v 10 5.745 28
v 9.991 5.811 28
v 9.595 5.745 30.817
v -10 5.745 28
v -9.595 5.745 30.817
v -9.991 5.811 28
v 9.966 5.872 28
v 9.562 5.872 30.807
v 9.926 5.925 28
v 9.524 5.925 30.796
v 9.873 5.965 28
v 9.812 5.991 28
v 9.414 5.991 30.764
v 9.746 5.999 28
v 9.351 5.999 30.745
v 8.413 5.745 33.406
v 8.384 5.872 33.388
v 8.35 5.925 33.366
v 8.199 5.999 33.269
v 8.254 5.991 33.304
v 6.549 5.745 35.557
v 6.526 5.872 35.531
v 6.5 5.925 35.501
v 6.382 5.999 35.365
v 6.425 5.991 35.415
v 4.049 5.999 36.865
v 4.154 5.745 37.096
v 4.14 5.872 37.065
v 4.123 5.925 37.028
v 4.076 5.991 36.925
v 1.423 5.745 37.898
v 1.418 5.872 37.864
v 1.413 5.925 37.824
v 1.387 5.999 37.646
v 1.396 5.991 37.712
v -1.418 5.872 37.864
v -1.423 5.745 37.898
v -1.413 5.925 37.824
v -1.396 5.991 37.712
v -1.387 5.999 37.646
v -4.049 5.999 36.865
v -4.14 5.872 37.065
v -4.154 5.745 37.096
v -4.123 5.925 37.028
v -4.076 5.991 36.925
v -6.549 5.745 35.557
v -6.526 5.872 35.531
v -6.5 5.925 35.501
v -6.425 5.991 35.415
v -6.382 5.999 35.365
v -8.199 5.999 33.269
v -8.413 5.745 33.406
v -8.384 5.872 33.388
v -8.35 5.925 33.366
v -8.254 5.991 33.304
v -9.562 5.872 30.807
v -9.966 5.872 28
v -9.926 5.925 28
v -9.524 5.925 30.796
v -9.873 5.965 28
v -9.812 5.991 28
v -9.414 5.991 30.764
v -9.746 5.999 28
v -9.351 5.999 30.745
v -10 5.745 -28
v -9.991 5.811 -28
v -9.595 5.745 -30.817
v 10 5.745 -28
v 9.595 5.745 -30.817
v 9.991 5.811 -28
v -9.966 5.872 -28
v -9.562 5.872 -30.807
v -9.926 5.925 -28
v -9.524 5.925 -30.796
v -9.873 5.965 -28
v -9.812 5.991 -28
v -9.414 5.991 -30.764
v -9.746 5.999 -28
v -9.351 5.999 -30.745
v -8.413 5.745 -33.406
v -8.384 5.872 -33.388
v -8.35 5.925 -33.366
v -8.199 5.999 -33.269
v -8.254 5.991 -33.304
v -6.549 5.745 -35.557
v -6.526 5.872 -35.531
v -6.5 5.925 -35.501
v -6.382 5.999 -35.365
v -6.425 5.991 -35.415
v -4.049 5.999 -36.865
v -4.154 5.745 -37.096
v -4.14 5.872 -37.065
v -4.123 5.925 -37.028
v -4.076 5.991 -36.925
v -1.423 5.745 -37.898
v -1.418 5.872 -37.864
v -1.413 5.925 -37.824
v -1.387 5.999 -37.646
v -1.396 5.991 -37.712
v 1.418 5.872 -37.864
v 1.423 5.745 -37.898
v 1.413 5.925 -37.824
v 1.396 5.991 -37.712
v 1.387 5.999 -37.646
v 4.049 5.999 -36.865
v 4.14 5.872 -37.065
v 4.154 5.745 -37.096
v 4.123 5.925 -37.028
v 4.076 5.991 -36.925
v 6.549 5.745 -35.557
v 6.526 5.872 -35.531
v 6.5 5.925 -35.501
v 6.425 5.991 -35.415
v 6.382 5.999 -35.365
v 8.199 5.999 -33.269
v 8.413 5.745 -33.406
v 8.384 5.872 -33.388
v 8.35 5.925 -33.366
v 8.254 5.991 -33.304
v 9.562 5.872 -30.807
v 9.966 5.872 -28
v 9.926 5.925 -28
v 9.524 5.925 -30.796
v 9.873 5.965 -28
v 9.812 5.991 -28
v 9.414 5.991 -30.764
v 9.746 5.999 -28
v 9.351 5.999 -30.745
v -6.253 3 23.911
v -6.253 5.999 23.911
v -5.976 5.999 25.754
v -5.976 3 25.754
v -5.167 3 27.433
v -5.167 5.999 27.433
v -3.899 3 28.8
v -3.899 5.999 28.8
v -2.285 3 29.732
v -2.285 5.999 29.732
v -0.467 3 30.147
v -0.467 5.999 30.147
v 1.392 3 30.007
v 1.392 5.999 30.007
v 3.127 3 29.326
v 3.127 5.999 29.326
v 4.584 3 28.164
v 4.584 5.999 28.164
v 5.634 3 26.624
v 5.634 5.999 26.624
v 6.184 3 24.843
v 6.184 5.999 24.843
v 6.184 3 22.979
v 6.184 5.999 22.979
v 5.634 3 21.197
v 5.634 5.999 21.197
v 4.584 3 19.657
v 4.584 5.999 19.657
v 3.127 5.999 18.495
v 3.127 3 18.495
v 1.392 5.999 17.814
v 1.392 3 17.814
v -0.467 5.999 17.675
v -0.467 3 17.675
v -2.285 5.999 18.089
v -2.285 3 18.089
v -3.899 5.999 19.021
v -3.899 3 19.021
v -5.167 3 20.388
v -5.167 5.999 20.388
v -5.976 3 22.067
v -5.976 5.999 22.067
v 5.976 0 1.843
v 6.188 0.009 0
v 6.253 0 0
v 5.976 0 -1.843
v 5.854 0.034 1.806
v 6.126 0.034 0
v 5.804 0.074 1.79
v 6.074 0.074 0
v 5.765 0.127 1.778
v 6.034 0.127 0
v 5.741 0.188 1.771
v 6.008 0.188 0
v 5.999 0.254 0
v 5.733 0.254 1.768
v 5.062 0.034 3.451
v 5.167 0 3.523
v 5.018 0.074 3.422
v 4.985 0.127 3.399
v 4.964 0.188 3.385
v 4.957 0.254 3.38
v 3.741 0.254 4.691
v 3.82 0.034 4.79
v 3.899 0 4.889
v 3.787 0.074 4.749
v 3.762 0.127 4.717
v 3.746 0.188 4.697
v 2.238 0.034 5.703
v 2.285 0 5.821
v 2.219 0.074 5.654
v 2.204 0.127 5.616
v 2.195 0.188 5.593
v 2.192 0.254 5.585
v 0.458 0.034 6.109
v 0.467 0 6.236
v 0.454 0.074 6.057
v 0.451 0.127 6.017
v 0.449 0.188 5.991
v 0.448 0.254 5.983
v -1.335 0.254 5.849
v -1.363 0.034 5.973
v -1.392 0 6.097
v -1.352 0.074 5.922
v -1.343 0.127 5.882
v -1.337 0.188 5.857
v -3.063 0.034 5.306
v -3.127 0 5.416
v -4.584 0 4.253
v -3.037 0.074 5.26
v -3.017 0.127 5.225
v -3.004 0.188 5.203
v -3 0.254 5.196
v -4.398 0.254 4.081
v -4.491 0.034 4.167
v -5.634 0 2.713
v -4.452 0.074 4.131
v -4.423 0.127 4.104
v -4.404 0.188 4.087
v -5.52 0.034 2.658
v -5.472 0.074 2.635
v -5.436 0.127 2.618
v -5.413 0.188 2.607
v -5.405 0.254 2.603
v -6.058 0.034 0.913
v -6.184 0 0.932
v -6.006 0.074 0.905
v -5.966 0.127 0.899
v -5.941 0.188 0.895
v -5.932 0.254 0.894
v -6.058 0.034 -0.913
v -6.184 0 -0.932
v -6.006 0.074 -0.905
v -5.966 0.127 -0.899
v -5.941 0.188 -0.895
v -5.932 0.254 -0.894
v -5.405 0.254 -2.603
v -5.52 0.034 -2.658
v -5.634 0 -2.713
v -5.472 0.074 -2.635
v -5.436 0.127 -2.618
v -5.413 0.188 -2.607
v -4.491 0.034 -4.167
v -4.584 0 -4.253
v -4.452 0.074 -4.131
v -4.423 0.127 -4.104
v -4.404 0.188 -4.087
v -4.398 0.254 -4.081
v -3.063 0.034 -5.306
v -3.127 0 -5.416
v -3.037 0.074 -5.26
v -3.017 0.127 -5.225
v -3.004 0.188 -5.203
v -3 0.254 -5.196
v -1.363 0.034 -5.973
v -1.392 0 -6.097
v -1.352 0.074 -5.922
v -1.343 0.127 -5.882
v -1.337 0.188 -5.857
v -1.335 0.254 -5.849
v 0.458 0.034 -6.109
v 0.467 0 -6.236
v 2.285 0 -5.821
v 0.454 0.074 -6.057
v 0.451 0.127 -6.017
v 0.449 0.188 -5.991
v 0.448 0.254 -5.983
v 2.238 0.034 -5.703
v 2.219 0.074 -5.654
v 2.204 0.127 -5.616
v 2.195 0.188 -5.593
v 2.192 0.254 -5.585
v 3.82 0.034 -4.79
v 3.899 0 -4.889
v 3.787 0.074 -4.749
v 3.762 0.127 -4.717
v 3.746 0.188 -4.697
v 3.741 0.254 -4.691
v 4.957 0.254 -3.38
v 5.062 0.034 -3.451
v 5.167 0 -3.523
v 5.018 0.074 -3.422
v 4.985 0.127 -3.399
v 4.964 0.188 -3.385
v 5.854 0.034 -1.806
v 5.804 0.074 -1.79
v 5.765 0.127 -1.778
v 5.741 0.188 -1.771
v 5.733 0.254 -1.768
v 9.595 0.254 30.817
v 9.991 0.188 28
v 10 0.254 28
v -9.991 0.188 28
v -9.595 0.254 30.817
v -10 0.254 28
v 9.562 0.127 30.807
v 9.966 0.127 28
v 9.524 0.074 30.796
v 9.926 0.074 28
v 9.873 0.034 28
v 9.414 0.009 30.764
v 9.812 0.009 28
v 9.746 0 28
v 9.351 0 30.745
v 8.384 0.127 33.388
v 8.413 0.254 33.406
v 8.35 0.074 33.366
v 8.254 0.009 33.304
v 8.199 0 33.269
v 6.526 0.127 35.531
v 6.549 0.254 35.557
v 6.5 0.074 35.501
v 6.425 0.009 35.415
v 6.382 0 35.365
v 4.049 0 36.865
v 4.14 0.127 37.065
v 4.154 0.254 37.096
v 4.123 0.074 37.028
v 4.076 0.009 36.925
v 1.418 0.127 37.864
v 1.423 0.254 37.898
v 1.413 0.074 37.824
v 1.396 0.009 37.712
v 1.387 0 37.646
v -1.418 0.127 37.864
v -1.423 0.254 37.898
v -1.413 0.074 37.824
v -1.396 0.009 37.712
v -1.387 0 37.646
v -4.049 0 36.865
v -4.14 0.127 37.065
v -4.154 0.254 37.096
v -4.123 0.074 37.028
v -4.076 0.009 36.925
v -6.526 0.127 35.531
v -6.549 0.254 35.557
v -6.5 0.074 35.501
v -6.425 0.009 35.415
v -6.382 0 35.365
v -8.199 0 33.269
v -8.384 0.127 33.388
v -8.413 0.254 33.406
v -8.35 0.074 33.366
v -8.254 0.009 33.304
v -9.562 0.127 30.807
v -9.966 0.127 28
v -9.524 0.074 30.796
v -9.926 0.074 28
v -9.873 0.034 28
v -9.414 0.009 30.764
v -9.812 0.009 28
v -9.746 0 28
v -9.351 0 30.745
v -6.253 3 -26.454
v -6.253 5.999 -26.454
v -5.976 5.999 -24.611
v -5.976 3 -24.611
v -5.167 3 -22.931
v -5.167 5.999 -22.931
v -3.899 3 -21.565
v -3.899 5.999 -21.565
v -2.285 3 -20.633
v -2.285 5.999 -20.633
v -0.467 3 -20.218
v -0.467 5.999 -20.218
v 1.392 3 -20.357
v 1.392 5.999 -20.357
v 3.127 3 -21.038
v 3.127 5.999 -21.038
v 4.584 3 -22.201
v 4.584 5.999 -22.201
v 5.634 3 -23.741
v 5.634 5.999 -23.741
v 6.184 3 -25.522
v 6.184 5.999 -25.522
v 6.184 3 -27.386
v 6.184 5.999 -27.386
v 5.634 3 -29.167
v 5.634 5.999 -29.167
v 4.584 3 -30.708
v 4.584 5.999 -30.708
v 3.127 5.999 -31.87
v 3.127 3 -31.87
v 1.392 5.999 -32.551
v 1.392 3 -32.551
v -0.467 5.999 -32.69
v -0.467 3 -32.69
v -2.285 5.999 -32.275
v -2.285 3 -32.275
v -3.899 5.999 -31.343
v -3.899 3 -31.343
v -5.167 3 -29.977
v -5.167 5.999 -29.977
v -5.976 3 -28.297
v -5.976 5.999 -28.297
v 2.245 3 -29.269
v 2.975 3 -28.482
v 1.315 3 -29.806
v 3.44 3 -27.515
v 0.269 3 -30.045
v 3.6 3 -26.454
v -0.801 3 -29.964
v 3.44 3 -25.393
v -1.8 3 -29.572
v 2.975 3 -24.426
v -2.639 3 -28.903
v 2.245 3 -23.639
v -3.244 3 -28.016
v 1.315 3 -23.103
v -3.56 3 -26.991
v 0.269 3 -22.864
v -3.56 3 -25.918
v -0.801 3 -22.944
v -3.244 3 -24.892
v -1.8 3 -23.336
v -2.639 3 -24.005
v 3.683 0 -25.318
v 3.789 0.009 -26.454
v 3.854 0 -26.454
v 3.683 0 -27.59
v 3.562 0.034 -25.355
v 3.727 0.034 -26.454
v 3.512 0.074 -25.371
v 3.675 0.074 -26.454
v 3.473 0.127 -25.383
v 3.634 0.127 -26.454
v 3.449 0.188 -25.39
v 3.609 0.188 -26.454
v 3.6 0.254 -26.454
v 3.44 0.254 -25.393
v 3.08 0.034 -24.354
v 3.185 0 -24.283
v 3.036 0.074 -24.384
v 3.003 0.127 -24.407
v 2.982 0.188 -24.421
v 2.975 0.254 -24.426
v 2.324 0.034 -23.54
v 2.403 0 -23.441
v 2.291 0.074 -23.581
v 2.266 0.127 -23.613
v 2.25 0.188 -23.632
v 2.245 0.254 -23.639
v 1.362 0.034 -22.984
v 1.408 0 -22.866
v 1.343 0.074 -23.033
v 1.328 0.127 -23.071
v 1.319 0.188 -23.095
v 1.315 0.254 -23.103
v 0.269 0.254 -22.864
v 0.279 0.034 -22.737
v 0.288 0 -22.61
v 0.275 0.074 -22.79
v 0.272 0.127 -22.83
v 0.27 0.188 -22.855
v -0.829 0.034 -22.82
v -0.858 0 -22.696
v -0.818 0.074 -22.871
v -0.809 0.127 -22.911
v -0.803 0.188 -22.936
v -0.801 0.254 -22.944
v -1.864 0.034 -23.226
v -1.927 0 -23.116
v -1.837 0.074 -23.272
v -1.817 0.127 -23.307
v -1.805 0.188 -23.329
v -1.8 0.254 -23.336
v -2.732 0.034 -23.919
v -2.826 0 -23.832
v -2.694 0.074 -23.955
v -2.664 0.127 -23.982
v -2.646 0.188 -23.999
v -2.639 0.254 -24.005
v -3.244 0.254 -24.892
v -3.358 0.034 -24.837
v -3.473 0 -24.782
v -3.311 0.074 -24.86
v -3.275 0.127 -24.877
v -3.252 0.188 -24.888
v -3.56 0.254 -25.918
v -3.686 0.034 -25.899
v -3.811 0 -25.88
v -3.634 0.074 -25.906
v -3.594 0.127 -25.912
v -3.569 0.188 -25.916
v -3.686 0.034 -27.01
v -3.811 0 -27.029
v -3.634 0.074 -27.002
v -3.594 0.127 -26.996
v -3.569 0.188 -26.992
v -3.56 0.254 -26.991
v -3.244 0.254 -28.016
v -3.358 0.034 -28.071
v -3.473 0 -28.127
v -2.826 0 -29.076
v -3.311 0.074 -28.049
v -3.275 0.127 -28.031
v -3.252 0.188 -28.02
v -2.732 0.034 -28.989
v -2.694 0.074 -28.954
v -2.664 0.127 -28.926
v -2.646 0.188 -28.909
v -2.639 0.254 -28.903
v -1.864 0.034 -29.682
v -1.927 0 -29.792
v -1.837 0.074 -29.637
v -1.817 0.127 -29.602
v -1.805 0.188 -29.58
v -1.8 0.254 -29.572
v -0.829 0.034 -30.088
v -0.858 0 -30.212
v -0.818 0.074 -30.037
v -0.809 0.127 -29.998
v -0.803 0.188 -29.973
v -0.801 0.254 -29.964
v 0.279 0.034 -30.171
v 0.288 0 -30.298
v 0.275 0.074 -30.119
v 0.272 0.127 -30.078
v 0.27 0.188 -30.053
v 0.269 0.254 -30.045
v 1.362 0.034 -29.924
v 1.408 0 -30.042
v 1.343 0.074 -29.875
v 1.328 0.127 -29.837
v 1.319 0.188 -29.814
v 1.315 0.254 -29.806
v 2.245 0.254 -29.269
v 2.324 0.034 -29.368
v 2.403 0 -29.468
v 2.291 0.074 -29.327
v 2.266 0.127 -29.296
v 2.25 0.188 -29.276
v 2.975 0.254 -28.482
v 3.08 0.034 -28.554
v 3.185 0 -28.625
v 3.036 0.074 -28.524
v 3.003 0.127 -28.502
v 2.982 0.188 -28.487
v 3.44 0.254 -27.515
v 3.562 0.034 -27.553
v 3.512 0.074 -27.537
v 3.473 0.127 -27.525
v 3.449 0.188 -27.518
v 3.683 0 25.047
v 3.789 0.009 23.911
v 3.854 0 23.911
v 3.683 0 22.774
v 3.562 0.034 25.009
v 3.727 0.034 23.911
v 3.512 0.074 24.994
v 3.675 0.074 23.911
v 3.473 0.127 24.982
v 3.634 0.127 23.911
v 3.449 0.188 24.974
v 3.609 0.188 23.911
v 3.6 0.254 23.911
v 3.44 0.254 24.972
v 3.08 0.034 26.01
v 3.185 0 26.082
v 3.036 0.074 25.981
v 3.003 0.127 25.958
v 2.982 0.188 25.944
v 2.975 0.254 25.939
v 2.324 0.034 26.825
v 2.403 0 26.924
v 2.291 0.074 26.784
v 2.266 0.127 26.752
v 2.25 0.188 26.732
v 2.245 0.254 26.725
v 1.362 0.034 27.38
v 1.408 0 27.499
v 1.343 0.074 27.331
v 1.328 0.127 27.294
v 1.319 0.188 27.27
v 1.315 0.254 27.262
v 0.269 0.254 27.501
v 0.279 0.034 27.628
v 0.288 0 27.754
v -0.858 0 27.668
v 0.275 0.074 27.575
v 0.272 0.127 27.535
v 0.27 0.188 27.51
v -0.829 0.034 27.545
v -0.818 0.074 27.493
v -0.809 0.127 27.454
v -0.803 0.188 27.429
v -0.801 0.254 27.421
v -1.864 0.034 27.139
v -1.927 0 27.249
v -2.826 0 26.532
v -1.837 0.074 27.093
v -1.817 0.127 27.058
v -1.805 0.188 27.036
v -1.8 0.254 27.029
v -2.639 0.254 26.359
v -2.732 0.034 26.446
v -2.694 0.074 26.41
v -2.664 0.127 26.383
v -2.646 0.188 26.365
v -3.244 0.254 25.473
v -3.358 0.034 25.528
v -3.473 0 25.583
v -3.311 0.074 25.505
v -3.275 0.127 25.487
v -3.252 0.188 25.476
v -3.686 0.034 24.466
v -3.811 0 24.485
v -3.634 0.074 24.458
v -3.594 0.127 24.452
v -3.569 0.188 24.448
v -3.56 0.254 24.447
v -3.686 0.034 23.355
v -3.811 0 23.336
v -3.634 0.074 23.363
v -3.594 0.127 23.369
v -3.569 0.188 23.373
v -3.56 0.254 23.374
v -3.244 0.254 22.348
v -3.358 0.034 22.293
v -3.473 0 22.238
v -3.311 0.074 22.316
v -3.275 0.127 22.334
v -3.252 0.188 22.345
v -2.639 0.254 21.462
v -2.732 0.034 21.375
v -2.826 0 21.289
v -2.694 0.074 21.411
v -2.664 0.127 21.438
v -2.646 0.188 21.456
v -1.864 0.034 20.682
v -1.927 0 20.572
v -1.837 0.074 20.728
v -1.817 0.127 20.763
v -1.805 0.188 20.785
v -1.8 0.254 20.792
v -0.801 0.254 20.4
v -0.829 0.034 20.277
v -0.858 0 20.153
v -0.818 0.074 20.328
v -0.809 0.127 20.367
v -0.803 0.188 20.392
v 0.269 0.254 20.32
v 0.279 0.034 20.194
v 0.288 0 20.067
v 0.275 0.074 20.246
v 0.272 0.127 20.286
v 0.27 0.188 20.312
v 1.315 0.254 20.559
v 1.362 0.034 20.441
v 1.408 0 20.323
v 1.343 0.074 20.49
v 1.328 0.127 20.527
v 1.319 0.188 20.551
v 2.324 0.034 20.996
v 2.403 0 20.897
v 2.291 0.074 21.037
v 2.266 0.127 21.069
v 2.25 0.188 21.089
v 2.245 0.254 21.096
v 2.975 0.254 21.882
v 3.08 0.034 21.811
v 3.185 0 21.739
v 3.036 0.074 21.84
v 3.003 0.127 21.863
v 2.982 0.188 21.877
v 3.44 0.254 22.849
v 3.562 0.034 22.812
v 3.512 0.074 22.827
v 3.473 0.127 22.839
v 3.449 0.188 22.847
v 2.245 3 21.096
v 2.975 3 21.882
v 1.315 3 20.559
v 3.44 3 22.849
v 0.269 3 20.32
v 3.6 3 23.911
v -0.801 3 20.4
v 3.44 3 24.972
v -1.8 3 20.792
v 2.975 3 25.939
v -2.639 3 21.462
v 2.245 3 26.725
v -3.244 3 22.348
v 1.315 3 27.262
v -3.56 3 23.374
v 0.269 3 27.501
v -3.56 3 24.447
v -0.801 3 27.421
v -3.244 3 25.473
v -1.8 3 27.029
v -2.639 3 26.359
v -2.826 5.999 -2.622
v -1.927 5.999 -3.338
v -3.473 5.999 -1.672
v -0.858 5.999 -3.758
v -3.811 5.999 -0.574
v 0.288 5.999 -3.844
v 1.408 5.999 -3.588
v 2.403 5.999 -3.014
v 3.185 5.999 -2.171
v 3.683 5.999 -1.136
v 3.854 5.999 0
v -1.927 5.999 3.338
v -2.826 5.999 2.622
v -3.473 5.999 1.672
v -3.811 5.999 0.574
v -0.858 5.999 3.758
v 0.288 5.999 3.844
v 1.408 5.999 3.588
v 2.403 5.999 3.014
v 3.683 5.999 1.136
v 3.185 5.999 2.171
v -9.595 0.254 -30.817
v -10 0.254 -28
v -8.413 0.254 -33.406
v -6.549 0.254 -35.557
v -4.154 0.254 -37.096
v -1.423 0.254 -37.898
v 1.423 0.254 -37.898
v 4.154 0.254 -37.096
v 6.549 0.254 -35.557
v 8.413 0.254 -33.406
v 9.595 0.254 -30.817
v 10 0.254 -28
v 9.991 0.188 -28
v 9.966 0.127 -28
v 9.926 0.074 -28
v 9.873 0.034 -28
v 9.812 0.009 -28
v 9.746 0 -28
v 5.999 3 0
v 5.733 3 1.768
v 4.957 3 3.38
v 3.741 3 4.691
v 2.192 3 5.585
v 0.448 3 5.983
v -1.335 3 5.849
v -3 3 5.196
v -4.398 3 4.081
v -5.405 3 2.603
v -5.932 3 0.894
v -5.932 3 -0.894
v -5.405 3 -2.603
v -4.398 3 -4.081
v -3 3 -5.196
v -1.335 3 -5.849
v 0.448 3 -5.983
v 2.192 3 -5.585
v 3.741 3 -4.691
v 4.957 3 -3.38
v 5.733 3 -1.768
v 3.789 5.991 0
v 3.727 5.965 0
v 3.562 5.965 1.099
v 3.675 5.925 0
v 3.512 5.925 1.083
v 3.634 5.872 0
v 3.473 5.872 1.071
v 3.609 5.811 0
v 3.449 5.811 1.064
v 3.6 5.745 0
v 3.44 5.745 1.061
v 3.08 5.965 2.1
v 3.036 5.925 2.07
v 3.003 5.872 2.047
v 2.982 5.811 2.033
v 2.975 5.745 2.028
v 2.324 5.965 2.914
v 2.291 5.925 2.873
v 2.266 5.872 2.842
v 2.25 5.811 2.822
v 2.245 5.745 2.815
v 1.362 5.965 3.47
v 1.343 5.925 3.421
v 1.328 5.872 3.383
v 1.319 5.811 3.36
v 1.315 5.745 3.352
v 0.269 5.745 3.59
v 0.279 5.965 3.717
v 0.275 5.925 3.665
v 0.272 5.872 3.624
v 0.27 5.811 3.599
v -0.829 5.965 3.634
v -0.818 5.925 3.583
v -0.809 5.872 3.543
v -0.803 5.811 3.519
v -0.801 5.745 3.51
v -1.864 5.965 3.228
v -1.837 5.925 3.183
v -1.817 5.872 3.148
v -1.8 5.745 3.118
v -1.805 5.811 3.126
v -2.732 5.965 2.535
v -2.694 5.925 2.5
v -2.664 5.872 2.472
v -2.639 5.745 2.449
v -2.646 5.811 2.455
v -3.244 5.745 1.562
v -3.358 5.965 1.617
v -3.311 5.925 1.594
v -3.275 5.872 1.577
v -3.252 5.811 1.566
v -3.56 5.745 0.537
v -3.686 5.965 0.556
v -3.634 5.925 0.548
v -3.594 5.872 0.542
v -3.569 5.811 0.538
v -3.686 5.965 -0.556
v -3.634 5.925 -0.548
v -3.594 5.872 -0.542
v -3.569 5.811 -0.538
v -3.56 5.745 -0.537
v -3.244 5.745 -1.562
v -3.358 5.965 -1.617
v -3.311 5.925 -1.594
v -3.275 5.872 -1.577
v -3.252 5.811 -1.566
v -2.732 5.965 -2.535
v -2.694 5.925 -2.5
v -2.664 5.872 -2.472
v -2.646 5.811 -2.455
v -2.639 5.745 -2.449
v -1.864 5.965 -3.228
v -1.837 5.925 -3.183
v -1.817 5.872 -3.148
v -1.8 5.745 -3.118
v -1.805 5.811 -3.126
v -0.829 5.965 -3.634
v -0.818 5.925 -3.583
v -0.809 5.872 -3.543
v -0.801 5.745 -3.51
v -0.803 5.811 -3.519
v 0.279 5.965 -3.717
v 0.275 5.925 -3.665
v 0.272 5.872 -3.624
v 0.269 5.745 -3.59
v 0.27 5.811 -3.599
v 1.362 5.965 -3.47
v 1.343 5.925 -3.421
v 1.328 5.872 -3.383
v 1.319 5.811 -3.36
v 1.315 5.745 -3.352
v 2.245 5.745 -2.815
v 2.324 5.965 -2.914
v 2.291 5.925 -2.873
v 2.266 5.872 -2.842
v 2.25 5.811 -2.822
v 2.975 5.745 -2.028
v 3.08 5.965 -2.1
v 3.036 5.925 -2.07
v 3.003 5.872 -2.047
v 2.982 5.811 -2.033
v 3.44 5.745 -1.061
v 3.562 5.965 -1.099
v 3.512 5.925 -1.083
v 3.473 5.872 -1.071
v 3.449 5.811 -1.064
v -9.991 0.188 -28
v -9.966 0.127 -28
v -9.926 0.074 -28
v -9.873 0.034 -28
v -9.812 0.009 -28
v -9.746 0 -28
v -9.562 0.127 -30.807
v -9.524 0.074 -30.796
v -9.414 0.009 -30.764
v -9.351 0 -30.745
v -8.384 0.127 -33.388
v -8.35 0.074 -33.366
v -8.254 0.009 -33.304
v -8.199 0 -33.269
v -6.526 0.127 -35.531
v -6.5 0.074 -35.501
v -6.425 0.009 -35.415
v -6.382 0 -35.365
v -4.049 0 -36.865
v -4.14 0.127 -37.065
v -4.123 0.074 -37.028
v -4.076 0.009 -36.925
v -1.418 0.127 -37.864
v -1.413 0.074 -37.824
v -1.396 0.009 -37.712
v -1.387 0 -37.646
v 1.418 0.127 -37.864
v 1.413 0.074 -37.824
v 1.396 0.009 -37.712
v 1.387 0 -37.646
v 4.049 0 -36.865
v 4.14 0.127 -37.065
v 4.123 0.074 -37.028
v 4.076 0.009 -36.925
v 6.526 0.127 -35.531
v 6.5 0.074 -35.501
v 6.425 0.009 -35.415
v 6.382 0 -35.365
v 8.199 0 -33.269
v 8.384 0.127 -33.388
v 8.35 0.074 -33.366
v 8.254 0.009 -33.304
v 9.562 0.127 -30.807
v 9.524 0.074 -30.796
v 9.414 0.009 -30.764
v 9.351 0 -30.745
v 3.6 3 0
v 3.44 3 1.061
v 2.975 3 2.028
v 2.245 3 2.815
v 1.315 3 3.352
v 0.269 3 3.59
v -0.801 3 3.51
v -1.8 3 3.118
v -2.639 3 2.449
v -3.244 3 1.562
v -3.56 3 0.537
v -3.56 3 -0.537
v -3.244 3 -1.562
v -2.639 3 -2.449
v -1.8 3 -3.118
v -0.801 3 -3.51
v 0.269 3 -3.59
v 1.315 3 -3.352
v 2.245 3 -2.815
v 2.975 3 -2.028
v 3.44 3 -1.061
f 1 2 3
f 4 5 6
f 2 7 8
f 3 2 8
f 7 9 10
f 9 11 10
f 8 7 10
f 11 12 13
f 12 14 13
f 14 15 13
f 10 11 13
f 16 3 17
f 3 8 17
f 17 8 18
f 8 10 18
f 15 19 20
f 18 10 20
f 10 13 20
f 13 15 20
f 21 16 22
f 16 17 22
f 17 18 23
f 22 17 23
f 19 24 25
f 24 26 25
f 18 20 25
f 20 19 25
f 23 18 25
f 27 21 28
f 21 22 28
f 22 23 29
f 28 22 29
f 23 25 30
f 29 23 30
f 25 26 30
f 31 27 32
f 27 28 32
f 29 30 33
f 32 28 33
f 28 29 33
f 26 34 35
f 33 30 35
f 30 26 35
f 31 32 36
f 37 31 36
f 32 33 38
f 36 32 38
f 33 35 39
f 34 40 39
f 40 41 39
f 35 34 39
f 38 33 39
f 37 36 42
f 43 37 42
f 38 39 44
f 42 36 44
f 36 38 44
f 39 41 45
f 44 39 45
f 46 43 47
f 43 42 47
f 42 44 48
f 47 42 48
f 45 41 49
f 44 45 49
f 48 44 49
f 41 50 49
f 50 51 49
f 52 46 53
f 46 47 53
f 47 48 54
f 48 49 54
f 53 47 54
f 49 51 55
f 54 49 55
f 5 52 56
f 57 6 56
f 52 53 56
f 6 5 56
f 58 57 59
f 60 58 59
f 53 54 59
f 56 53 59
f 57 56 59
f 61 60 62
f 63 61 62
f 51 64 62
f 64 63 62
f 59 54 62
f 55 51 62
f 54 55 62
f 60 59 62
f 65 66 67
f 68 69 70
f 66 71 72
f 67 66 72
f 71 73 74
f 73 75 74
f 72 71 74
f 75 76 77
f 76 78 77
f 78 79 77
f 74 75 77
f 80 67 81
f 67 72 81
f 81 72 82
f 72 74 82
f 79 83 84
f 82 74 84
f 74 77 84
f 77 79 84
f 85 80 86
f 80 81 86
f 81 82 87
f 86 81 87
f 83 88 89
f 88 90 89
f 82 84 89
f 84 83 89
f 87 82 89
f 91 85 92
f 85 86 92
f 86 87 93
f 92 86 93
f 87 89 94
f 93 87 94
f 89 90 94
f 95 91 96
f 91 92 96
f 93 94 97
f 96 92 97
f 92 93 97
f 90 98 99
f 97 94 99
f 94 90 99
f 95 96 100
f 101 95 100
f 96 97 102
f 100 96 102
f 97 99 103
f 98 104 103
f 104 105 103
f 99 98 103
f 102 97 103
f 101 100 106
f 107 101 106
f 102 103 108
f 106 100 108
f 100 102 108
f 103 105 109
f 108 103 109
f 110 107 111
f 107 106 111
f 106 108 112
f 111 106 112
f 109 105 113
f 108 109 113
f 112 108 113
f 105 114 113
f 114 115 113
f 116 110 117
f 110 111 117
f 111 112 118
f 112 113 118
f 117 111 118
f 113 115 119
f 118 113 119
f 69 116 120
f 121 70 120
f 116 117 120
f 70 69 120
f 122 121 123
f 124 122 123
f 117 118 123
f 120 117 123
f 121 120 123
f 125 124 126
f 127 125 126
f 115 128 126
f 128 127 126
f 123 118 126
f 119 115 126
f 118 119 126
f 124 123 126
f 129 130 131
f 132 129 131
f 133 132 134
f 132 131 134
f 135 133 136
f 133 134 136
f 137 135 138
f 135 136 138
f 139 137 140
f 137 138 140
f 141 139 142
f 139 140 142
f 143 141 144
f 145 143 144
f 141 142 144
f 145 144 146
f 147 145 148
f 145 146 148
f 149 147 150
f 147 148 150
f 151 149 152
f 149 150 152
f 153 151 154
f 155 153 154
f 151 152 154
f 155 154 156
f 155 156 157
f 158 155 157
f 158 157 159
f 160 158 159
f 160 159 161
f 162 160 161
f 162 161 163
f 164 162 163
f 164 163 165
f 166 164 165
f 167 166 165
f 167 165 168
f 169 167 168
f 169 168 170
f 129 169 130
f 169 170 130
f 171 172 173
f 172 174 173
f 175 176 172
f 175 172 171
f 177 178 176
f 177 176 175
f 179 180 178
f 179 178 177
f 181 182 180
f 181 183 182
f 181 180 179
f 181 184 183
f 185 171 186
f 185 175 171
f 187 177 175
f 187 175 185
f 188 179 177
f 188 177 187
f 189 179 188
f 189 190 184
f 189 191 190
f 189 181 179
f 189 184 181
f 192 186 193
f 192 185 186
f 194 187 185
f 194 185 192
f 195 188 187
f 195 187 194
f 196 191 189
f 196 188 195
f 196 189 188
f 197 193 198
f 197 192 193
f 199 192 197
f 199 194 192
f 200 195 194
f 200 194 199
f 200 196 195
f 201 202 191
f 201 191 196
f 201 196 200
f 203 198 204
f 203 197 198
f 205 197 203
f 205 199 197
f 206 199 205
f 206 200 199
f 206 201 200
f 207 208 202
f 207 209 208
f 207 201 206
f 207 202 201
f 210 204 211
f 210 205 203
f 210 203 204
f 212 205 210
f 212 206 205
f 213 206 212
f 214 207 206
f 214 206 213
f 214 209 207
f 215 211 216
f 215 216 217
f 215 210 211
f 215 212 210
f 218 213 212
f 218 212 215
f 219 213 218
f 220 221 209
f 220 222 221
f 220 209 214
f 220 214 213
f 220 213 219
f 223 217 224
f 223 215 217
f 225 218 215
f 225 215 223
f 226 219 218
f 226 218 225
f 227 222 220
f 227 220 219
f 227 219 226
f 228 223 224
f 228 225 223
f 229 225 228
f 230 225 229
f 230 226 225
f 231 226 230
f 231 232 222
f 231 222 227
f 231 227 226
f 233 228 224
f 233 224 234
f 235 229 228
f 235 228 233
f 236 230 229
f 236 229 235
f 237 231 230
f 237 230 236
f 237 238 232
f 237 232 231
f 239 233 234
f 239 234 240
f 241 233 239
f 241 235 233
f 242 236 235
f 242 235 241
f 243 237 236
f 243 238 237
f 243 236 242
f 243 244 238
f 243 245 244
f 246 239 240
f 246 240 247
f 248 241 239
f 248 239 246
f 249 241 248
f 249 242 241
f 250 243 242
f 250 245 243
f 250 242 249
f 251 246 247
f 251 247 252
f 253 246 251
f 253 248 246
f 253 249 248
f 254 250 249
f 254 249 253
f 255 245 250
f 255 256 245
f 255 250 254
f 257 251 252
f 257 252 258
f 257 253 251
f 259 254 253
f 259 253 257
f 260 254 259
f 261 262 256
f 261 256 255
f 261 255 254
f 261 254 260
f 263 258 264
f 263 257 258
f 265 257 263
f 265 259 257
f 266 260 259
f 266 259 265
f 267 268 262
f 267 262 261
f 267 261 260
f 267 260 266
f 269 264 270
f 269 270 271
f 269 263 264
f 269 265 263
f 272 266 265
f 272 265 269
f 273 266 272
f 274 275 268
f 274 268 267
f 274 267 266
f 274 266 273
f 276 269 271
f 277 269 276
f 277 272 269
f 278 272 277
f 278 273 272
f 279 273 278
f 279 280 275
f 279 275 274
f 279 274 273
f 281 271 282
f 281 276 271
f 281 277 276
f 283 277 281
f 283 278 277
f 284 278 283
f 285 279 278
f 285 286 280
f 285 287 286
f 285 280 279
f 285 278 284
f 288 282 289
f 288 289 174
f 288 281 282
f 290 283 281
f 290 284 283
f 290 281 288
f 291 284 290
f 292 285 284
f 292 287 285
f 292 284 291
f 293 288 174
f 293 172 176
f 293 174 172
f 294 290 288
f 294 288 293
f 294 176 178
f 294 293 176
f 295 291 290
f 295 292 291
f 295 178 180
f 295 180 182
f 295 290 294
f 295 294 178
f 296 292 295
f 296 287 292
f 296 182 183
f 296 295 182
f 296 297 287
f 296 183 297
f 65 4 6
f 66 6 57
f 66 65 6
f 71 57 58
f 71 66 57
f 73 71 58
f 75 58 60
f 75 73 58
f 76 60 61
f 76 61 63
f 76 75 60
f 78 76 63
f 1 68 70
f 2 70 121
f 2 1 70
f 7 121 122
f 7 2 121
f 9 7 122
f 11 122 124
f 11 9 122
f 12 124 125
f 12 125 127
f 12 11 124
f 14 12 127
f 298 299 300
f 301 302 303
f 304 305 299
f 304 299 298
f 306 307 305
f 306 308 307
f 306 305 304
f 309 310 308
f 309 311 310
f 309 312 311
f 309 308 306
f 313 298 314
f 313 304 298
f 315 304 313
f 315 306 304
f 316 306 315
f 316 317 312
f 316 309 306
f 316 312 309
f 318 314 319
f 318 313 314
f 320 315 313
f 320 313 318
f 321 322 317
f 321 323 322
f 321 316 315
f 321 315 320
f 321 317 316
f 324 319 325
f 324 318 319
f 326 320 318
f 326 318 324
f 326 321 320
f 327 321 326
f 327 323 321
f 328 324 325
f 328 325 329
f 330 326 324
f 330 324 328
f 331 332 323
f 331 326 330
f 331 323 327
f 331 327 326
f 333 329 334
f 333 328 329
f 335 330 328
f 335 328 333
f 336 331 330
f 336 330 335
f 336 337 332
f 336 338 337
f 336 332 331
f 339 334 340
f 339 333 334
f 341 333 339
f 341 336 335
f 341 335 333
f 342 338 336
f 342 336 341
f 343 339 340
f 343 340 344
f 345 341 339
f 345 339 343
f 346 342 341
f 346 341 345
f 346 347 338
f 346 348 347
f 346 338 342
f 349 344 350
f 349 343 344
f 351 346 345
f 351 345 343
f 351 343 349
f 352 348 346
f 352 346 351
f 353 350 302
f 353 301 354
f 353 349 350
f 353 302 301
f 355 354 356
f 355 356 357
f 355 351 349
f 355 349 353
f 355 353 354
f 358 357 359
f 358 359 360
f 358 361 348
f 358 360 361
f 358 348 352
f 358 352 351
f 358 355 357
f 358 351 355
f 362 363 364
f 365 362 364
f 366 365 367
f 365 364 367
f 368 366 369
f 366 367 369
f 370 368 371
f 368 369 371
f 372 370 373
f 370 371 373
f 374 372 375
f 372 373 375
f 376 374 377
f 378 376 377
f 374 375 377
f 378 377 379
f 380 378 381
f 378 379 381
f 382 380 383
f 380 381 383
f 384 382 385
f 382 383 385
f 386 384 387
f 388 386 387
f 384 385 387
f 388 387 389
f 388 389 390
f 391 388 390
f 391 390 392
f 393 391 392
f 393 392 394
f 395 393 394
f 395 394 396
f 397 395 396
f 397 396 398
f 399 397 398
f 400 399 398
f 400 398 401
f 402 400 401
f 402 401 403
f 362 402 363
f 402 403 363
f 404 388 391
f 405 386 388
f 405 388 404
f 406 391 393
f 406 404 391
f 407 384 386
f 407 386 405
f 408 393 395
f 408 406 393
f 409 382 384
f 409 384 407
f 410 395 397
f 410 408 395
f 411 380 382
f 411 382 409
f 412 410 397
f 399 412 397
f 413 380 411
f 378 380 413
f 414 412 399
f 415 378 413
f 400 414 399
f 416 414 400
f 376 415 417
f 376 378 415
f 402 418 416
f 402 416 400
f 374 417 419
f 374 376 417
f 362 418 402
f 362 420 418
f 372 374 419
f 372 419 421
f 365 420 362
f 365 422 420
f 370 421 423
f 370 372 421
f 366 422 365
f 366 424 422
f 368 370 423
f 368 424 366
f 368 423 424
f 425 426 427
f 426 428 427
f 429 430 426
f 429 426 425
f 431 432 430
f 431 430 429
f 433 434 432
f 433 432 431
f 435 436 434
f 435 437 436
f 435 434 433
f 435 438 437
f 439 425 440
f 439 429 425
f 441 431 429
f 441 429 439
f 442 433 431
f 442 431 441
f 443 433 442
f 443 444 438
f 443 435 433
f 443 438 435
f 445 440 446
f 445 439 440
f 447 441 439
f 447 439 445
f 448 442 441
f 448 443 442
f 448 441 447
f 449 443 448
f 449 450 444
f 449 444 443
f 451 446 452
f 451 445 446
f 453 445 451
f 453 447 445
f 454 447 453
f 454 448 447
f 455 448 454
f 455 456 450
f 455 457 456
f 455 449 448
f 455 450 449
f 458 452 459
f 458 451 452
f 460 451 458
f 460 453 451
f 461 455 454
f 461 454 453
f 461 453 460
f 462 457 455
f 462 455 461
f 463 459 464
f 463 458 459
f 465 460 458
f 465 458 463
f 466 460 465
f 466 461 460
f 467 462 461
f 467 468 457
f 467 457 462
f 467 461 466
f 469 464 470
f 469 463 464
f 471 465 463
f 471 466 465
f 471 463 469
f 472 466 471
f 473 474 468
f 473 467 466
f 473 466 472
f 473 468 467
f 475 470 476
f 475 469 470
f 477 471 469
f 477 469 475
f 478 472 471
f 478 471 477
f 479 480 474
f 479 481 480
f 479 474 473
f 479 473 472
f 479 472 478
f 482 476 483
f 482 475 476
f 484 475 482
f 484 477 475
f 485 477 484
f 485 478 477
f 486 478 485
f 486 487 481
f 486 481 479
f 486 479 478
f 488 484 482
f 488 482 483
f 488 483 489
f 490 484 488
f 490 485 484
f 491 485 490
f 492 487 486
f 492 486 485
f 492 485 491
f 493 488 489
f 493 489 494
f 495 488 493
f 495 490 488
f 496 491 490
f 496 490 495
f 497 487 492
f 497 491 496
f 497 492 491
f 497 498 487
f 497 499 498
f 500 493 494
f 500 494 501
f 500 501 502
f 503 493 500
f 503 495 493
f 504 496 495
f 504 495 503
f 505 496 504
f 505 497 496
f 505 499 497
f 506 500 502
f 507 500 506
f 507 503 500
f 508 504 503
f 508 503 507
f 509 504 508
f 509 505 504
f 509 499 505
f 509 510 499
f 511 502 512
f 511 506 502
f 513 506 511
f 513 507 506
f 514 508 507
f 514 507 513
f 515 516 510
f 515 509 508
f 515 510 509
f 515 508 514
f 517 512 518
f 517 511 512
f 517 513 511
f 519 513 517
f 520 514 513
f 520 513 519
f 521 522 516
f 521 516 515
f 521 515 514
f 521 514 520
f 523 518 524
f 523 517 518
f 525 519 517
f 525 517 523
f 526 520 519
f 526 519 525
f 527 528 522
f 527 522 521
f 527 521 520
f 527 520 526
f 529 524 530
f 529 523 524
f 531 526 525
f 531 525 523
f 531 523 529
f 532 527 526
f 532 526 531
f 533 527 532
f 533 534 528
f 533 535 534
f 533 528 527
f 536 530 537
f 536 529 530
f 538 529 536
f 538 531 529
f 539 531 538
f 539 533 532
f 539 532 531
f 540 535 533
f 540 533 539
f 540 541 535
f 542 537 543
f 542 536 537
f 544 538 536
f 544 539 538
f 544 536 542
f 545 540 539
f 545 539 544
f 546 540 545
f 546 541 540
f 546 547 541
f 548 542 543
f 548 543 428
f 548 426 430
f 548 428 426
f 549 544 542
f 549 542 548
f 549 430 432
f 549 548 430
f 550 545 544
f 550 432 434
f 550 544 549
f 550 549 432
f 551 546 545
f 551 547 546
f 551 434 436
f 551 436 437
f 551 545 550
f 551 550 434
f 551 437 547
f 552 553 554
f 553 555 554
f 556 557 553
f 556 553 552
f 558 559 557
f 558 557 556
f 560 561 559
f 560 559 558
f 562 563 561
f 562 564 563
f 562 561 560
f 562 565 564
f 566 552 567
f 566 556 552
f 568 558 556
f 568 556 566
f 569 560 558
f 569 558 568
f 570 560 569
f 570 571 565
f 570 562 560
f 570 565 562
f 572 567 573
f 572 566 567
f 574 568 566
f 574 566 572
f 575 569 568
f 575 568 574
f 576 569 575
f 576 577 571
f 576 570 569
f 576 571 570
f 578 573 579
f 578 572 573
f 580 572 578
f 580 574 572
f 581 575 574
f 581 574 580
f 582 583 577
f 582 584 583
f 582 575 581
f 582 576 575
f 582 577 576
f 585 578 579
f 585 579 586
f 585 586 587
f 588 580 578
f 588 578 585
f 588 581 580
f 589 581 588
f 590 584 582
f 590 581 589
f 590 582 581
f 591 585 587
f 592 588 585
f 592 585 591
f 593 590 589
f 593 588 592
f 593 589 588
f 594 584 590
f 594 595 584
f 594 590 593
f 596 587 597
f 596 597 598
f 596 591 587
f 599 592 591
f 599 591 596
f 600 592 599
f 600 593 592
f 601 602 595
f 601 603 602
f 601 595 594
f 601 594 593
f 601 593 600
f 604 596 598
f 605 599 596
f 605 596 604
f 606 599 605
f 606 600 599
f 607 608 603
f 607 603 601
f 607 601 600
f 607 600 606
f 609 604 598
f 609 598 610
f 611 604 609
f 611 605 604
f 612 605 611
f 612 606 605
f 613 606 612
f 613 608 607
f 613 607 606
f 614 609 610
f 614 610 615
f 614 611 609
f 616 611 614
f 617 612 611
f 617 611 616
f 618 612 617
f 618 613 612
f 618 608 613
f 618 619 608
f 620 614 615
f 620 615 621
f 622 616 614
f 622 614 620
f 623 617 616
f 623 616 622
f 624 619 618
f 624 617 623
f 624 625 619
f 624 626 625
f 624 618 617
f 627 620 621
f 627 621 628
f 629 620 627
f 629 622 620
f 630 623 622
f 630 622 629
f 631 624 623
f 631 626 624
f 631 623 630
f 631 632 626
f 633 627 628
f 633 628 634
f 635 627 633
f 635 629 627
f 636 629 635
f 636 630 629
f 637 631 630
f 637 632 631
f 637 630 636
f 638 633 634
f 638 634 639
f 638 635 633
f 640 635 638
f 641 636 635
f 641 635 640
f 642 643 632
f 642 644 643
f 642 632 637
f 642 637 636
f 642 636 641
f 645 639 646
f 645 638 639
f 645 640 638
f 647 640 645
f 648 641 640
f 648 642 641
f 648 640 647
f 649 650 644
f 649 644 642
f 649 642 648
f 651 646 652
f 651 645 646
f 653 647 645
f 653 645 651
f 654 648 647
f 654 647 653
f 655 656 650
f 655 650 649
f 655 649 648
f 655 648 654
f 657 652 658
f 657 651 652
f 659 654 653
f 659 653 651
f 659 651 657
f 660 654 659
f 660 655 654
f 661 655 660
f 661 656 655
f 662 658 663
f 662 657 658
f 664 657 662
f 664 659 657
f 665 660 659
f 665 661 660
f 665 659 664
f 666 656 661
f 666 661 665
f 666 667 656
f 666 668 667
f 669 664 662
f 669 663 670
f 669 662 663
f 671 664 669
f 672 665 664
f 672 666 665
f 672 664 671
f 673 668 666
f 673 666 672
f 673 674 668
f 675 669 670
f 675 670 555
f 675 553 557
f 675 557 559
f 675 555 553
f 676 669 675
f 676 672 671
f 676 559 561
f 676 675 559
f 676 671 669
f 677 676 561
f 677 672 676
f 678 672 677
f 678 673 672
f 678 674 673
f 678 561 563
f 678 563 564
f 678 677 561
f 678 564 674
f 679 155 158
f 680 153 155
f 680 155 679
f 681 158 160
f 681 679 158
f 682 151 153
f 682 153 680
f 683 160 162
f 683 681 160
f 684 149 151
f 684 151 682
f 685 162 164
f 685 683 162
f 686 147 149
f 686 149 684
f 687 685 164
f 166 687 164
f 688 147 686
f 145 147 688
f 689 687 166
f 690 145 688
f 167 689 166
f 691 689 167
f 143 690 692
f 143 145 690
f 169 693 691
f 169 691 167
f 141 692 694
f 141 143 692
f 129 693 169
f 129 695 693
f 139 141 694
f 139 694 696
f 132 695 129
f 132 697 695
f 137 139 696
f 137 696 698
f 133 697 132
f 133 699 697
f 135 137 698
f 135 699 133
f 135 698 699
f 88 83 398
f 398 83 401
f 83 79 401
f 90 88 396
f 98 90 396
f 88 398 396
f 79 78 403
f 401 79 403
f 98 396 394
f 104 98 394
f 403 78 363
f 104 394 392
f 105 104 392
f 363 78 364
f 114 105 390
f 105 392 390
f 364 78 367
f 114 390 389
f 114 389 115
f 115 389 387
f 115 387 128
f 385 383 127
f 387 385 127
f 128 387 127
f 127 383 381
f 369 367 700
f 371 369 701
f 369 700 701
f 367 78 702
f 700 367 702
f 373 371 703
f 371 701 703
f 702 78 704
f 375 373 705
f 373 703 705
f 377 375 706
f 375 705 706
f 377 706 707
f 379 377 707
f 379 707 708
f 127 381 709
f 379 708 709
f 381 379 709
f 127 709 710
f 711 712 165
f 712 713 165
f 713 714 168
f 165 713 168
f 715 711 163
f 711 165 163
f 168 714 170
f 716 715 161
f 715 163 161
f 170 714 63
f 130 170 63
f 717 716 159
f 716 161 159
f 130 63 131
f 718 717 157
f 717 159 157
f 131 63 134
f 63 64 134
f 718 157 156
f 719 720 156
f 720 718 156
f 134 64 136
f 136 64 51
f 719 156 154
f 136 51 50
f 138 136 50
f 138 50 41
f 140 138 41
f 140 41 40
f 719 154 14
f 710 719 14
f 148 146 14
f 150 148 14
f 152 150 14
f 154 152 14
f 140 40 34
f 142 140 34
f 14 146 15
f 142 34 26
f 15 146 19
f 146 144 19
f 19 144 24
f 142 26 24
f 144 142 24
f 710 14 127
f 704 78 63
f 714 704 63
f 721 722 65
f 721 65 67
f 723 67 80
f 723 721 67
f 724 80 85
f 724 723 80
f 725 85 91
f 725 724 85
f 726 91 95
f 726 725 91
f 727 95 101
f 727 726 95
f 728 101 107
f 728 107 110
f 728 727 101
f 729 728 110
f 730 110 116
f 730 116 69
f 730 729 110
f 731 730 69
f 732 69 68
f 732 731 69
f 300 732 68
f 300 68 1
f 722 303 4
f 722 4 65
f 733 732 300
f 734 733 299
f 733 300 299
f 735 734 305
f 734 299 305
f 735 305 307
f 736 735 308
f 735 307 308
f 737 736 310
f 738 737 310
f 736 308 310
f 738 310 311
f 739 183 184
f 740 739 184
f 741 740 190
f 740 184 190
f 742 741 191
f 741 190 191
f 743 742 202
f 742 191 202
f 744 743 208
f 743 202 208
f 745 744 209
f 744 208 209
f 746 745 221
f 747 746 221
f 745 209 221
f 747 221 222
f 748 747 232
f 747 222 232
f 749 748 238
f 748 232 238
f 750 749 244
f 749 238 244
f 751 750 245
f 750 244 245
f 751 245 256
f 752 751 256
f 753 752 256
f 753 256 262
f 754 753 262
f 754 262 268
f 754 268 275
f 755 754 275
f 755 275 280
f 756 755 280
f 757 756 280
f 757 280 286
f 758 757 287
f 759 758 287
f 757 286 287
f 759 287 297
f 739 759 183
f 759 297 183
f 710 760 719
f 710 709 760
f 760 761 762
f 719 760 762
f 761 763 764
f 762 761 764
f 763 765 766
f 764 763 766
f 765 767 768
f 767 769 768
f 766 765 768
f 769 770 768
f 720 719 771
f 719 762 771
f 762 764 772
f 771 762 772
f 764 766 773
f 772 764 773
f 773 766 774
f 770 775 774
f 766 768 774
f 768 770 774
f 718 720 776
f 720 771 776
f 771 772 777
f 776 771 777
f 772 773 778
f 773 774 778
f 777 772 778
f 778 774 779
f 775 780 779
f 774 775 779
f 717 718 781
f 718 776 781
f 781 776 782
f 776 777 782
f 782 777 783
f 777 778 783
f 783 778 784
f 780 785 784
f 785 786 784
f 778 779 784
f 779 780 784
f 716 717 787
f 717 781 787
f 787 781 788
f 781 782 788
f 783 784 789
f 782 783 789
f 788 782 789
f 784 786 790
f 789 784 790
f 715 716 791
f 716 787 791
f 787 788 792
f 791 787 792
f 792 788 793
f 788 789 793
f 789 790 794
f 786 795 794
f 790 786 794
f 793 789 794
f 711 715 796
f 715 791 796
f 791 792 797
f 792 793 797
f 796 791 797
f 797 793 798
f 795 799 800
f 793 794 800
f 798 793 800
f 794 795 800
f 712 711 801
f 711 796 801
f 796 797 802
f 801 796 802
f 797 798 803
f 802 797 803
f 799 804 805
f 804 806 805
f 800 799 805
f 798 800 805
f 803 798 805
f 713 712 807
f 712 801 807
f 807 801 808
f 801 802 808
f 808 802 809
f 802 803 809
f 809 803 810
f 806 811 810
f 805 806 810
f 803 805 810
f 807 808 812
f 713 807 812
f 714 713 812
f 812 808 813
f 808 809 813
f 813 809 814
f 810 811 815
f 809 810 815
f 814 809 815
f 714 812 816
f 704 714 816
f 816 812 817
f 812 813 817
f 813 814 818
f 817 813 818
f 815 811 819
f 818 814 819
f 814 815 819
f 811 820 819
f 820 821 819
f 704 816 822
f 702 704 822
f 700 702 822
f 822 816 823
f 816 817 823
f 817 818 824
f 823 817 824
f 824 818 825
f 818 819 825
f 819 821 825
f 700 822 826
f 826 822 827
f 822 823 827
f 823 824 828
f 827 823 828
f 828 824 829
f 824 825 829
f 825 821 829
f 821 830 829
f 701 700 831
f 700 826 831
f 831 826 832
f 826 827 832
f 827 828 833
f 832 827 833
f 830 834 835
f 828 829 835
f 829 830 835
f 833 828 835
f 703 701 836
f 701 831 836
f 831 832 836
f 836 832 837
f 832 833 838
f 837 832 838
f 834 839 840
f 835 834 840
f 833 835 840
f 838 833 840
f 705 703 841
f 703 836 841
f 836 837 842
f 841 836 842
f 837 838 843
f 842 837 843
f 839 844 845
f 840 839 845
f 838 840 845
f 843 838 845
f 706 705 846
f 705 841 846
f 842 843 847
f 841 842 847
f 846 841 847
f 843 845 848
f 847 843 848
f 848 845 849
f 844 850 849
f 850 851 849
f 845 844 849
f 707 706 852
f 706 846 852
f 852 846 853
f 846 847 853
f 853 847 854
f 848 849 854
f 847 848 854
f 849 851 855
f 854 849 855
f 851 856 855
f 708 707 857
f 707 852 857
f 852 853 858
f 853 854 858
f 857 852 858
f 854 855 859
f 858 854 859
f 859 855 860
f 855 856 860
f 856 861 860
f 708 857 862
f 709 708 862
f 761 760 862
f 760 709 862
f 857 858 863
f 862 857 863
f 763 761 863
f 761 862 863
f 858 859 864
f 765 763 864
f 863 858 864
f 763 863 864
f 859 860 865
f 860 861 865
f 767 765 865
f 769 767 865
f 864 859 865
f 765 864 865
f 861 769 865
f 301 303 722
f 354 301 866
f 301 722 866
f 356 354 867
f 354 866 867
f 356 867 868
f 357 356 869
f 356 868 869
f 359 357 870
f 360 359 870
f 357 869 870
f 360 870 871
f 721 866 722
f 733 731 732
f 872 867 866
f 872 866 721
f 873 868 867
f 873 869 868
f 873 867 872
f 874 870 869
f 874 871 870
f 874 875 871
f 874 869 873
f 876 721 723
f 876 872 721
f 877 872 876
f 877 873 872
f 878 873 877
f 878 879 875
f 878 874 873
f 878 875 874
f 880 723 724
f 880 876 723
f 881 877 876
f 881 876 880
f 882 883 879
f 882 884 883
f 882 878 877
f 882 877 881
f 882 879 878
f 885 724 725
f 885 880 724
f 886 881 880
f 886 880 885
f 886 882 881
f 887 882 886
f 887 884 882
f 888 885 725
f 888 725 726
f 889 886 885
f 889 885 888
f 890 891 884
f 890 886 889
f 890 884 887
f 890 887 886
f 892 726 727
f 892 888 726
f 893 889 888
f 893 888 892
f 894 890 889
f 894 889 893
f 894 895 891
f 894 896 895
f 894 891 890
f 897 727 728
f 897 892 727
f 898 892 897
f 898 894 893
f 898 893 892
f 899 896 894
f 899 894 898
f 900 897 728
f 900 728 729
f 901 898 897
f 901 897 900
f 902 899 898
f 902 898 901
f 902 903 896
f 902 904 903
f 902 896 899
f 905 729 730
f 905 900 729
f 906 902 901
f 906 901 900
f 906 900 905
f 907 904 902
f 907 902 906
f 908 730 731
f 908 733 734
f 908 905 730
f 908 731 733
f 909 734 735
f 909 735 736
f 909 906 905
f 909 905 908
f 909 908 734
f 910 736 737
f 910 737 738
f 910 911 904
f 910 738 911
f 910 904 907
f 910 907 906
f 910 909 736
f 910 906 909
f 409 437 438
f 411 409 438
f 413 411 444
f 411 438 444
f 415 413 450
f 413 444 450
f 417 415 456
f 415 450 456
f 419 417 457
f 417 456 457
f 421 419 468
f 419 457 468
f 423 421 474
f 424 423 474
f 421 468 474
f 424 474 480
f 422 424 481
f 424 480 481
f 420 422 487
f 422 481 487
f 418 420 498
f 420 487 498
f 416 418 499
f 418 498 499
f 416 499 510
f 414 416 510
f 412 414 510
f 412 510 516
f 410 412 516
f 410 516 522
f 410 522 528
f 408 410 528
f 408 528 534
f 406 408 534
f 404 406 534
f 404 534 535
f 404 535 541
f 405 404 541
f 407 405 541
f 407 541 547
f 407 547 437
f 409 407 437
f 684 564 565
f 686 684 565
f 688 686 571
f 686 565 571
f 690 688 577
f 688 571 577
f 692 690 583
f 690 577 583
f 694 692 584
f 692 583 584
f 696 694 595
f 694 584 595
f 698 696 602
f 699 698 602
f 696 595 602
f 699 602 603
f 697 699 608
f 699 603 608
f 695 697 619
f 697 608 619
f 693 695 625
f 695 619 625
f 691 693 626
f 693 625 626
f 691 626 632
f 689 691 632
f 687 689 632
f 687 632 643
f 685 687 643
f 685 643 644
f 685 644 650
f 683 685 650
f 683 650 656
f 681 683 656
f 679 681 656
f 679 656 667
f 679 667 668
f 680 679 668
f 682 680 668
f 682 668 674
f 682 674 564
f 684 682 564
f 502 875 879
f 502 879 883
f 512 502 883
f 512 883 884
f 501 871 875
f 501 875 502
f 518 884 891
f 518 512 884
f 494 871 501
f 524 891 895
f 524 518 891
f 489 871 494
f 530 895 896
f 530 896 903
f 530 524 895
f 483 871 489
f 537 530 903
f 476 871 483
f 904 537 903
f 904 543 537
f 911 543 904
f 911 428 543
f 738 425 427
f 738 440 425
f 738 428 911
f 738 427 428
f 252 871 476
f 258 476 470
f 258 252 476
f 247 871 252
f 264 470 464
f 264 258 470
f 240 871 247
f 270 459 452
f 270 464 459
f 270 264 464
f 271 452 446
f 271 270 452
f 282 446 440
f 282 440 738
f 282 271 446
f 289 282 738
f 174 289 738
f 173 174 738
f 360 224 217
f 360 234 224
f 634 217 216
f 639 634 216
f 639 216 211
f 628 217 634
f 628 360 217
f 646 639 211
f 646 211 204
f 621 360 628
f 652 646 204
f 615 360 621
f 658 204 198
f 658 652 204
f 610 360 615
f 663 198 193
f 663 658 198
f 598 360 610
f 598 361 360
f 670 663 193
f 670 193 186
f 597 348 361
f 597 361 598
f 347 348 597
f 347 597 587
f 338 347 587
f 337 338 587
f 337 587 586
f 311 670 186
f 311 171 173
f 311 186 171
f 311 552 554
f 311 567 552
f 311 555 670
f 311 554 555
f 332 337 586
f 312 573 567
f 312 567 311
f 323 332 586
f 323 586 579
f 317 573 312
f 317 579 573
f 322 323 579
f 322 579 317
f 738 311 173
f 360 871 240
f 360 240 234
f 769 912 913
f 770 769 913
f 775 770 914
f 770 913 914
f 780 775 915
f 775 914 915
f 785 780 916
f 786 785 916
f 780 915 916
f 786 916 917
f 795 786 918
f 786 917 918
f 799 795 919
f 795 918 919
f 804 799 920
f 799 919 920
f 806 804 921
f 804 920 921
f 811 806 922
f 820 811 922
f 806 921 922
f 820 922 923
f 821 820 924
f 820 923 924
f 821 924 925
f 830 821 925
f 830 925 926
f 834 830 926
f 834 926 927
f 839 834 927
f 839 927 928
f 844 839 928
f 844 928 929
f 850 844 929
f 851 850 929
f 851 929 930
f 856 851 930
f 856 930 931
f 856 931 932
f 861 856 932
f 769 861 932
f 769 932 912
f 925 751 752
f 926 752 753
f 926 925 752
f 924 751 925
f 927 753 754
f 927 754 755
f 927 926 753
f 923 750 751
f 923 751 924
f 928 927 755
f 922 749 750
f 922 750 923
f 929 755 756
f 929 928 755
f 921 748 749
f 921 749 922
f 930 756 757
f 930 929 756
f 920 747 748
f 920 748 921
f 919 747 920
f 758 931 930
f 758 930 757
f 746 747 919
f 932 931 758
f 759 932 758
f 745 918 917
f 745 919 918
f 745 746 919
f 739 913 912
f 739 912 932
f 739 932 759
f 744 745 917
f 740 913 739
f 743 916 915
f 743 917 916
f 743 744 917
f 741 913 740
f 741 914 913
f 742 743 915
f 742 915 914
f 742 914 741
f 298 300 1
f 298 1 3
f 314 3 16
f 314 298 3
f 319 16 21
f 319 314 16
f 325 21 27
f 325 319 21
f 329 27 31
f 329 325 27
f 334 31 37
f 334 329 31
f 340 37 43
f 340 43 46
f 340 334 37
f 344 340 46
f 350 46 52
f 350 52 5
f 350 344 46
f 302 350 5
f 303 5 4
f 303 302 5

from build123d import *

# Parameters (mm, degrees)
F0_R     = 3.60045
F1_DEPTH = 5.99948
F2_R     = 5.99948
F3_DEPTH = 2.99974
F4_R     = 0.254
F5_R     = 6.25348
F6_DEPTH = 2.99974


with BuildPart() as f1:
    # F0 (on Front) → F1 (new body)
    with BuildSketch(Plane.XZ):
        with BuildLine():
            ThreePointArc((-9.99998, -27.99969), (0, -37.99967), (9.99998, -27.99969))
            Line((9.99998, -27.99969), (9.99998, 27.99969))
            ThreePointArc((9.99998, 27.99969), (0, 37.99967), (-9.99998, 27.99969))
            Line((-9.99998, 27.99969), (-9.99998, -27.99969))
        make_face()
        with Locations((0, -26.454154)):
            Circle(F0_R, mode=Mode.SUBTRACT)
        Circle(F0_R, mode=Mode.SUBTRACT)
        with Locations((0, 23.910544)):
            Circle(F0_R, mode=Mode.SUBTRACT)
    extrude(amount=-F1_DEPTH)

    # F2 (on Front) → F3 (cut)
    with BuildSketch(Plane.XZ):
        Circle(F2_R)
    extrude(amount=-F3_DEPTH, mode=Mode.SUBTRACT)

    # F4
    f4_edges = [f1.edges().sort_by_distance(p)[0] for p in [
        (0, 0, -37.99967),
        (-9.99998, 0, 0),
        (9.99998, 0, 0),
        (0, 0, 37.99967),
        (-3.60045, 0, -26.454154),
        (-5.99948, 0, 0),
        (-3.60045, 0, 23.910544),
        (0, 5.99948, -37.99967),
        (9.99998, 5.99948, 0),
        (0, 5.99948, 37.99967),
        (-9.99998, 5.99948, 0),
        (-3.60045, 5.99948, -26.454154),
        (-3.60045, 5.99948, 0),
        (-3.60045, 5.99948, 23.910544),
    ]]
    fillet(f4_edges, radius=F4_R)

    # F5 (on face) → F6 (cut)
    with BuildSketch(Plane(origin=(0, 5.99948, 0), x_dir=(-1, 0, 0), z_dir=(0, 1, 0))):
        with Locations((0, 23.910544)):
            Circle(F5_R)
        with Locations((0, -26.454154)):
            Circle(F5_R)
    extrude(amount=-F6_DEPTH, mode=Mode.SUBTRACT)


solid = f1.part
